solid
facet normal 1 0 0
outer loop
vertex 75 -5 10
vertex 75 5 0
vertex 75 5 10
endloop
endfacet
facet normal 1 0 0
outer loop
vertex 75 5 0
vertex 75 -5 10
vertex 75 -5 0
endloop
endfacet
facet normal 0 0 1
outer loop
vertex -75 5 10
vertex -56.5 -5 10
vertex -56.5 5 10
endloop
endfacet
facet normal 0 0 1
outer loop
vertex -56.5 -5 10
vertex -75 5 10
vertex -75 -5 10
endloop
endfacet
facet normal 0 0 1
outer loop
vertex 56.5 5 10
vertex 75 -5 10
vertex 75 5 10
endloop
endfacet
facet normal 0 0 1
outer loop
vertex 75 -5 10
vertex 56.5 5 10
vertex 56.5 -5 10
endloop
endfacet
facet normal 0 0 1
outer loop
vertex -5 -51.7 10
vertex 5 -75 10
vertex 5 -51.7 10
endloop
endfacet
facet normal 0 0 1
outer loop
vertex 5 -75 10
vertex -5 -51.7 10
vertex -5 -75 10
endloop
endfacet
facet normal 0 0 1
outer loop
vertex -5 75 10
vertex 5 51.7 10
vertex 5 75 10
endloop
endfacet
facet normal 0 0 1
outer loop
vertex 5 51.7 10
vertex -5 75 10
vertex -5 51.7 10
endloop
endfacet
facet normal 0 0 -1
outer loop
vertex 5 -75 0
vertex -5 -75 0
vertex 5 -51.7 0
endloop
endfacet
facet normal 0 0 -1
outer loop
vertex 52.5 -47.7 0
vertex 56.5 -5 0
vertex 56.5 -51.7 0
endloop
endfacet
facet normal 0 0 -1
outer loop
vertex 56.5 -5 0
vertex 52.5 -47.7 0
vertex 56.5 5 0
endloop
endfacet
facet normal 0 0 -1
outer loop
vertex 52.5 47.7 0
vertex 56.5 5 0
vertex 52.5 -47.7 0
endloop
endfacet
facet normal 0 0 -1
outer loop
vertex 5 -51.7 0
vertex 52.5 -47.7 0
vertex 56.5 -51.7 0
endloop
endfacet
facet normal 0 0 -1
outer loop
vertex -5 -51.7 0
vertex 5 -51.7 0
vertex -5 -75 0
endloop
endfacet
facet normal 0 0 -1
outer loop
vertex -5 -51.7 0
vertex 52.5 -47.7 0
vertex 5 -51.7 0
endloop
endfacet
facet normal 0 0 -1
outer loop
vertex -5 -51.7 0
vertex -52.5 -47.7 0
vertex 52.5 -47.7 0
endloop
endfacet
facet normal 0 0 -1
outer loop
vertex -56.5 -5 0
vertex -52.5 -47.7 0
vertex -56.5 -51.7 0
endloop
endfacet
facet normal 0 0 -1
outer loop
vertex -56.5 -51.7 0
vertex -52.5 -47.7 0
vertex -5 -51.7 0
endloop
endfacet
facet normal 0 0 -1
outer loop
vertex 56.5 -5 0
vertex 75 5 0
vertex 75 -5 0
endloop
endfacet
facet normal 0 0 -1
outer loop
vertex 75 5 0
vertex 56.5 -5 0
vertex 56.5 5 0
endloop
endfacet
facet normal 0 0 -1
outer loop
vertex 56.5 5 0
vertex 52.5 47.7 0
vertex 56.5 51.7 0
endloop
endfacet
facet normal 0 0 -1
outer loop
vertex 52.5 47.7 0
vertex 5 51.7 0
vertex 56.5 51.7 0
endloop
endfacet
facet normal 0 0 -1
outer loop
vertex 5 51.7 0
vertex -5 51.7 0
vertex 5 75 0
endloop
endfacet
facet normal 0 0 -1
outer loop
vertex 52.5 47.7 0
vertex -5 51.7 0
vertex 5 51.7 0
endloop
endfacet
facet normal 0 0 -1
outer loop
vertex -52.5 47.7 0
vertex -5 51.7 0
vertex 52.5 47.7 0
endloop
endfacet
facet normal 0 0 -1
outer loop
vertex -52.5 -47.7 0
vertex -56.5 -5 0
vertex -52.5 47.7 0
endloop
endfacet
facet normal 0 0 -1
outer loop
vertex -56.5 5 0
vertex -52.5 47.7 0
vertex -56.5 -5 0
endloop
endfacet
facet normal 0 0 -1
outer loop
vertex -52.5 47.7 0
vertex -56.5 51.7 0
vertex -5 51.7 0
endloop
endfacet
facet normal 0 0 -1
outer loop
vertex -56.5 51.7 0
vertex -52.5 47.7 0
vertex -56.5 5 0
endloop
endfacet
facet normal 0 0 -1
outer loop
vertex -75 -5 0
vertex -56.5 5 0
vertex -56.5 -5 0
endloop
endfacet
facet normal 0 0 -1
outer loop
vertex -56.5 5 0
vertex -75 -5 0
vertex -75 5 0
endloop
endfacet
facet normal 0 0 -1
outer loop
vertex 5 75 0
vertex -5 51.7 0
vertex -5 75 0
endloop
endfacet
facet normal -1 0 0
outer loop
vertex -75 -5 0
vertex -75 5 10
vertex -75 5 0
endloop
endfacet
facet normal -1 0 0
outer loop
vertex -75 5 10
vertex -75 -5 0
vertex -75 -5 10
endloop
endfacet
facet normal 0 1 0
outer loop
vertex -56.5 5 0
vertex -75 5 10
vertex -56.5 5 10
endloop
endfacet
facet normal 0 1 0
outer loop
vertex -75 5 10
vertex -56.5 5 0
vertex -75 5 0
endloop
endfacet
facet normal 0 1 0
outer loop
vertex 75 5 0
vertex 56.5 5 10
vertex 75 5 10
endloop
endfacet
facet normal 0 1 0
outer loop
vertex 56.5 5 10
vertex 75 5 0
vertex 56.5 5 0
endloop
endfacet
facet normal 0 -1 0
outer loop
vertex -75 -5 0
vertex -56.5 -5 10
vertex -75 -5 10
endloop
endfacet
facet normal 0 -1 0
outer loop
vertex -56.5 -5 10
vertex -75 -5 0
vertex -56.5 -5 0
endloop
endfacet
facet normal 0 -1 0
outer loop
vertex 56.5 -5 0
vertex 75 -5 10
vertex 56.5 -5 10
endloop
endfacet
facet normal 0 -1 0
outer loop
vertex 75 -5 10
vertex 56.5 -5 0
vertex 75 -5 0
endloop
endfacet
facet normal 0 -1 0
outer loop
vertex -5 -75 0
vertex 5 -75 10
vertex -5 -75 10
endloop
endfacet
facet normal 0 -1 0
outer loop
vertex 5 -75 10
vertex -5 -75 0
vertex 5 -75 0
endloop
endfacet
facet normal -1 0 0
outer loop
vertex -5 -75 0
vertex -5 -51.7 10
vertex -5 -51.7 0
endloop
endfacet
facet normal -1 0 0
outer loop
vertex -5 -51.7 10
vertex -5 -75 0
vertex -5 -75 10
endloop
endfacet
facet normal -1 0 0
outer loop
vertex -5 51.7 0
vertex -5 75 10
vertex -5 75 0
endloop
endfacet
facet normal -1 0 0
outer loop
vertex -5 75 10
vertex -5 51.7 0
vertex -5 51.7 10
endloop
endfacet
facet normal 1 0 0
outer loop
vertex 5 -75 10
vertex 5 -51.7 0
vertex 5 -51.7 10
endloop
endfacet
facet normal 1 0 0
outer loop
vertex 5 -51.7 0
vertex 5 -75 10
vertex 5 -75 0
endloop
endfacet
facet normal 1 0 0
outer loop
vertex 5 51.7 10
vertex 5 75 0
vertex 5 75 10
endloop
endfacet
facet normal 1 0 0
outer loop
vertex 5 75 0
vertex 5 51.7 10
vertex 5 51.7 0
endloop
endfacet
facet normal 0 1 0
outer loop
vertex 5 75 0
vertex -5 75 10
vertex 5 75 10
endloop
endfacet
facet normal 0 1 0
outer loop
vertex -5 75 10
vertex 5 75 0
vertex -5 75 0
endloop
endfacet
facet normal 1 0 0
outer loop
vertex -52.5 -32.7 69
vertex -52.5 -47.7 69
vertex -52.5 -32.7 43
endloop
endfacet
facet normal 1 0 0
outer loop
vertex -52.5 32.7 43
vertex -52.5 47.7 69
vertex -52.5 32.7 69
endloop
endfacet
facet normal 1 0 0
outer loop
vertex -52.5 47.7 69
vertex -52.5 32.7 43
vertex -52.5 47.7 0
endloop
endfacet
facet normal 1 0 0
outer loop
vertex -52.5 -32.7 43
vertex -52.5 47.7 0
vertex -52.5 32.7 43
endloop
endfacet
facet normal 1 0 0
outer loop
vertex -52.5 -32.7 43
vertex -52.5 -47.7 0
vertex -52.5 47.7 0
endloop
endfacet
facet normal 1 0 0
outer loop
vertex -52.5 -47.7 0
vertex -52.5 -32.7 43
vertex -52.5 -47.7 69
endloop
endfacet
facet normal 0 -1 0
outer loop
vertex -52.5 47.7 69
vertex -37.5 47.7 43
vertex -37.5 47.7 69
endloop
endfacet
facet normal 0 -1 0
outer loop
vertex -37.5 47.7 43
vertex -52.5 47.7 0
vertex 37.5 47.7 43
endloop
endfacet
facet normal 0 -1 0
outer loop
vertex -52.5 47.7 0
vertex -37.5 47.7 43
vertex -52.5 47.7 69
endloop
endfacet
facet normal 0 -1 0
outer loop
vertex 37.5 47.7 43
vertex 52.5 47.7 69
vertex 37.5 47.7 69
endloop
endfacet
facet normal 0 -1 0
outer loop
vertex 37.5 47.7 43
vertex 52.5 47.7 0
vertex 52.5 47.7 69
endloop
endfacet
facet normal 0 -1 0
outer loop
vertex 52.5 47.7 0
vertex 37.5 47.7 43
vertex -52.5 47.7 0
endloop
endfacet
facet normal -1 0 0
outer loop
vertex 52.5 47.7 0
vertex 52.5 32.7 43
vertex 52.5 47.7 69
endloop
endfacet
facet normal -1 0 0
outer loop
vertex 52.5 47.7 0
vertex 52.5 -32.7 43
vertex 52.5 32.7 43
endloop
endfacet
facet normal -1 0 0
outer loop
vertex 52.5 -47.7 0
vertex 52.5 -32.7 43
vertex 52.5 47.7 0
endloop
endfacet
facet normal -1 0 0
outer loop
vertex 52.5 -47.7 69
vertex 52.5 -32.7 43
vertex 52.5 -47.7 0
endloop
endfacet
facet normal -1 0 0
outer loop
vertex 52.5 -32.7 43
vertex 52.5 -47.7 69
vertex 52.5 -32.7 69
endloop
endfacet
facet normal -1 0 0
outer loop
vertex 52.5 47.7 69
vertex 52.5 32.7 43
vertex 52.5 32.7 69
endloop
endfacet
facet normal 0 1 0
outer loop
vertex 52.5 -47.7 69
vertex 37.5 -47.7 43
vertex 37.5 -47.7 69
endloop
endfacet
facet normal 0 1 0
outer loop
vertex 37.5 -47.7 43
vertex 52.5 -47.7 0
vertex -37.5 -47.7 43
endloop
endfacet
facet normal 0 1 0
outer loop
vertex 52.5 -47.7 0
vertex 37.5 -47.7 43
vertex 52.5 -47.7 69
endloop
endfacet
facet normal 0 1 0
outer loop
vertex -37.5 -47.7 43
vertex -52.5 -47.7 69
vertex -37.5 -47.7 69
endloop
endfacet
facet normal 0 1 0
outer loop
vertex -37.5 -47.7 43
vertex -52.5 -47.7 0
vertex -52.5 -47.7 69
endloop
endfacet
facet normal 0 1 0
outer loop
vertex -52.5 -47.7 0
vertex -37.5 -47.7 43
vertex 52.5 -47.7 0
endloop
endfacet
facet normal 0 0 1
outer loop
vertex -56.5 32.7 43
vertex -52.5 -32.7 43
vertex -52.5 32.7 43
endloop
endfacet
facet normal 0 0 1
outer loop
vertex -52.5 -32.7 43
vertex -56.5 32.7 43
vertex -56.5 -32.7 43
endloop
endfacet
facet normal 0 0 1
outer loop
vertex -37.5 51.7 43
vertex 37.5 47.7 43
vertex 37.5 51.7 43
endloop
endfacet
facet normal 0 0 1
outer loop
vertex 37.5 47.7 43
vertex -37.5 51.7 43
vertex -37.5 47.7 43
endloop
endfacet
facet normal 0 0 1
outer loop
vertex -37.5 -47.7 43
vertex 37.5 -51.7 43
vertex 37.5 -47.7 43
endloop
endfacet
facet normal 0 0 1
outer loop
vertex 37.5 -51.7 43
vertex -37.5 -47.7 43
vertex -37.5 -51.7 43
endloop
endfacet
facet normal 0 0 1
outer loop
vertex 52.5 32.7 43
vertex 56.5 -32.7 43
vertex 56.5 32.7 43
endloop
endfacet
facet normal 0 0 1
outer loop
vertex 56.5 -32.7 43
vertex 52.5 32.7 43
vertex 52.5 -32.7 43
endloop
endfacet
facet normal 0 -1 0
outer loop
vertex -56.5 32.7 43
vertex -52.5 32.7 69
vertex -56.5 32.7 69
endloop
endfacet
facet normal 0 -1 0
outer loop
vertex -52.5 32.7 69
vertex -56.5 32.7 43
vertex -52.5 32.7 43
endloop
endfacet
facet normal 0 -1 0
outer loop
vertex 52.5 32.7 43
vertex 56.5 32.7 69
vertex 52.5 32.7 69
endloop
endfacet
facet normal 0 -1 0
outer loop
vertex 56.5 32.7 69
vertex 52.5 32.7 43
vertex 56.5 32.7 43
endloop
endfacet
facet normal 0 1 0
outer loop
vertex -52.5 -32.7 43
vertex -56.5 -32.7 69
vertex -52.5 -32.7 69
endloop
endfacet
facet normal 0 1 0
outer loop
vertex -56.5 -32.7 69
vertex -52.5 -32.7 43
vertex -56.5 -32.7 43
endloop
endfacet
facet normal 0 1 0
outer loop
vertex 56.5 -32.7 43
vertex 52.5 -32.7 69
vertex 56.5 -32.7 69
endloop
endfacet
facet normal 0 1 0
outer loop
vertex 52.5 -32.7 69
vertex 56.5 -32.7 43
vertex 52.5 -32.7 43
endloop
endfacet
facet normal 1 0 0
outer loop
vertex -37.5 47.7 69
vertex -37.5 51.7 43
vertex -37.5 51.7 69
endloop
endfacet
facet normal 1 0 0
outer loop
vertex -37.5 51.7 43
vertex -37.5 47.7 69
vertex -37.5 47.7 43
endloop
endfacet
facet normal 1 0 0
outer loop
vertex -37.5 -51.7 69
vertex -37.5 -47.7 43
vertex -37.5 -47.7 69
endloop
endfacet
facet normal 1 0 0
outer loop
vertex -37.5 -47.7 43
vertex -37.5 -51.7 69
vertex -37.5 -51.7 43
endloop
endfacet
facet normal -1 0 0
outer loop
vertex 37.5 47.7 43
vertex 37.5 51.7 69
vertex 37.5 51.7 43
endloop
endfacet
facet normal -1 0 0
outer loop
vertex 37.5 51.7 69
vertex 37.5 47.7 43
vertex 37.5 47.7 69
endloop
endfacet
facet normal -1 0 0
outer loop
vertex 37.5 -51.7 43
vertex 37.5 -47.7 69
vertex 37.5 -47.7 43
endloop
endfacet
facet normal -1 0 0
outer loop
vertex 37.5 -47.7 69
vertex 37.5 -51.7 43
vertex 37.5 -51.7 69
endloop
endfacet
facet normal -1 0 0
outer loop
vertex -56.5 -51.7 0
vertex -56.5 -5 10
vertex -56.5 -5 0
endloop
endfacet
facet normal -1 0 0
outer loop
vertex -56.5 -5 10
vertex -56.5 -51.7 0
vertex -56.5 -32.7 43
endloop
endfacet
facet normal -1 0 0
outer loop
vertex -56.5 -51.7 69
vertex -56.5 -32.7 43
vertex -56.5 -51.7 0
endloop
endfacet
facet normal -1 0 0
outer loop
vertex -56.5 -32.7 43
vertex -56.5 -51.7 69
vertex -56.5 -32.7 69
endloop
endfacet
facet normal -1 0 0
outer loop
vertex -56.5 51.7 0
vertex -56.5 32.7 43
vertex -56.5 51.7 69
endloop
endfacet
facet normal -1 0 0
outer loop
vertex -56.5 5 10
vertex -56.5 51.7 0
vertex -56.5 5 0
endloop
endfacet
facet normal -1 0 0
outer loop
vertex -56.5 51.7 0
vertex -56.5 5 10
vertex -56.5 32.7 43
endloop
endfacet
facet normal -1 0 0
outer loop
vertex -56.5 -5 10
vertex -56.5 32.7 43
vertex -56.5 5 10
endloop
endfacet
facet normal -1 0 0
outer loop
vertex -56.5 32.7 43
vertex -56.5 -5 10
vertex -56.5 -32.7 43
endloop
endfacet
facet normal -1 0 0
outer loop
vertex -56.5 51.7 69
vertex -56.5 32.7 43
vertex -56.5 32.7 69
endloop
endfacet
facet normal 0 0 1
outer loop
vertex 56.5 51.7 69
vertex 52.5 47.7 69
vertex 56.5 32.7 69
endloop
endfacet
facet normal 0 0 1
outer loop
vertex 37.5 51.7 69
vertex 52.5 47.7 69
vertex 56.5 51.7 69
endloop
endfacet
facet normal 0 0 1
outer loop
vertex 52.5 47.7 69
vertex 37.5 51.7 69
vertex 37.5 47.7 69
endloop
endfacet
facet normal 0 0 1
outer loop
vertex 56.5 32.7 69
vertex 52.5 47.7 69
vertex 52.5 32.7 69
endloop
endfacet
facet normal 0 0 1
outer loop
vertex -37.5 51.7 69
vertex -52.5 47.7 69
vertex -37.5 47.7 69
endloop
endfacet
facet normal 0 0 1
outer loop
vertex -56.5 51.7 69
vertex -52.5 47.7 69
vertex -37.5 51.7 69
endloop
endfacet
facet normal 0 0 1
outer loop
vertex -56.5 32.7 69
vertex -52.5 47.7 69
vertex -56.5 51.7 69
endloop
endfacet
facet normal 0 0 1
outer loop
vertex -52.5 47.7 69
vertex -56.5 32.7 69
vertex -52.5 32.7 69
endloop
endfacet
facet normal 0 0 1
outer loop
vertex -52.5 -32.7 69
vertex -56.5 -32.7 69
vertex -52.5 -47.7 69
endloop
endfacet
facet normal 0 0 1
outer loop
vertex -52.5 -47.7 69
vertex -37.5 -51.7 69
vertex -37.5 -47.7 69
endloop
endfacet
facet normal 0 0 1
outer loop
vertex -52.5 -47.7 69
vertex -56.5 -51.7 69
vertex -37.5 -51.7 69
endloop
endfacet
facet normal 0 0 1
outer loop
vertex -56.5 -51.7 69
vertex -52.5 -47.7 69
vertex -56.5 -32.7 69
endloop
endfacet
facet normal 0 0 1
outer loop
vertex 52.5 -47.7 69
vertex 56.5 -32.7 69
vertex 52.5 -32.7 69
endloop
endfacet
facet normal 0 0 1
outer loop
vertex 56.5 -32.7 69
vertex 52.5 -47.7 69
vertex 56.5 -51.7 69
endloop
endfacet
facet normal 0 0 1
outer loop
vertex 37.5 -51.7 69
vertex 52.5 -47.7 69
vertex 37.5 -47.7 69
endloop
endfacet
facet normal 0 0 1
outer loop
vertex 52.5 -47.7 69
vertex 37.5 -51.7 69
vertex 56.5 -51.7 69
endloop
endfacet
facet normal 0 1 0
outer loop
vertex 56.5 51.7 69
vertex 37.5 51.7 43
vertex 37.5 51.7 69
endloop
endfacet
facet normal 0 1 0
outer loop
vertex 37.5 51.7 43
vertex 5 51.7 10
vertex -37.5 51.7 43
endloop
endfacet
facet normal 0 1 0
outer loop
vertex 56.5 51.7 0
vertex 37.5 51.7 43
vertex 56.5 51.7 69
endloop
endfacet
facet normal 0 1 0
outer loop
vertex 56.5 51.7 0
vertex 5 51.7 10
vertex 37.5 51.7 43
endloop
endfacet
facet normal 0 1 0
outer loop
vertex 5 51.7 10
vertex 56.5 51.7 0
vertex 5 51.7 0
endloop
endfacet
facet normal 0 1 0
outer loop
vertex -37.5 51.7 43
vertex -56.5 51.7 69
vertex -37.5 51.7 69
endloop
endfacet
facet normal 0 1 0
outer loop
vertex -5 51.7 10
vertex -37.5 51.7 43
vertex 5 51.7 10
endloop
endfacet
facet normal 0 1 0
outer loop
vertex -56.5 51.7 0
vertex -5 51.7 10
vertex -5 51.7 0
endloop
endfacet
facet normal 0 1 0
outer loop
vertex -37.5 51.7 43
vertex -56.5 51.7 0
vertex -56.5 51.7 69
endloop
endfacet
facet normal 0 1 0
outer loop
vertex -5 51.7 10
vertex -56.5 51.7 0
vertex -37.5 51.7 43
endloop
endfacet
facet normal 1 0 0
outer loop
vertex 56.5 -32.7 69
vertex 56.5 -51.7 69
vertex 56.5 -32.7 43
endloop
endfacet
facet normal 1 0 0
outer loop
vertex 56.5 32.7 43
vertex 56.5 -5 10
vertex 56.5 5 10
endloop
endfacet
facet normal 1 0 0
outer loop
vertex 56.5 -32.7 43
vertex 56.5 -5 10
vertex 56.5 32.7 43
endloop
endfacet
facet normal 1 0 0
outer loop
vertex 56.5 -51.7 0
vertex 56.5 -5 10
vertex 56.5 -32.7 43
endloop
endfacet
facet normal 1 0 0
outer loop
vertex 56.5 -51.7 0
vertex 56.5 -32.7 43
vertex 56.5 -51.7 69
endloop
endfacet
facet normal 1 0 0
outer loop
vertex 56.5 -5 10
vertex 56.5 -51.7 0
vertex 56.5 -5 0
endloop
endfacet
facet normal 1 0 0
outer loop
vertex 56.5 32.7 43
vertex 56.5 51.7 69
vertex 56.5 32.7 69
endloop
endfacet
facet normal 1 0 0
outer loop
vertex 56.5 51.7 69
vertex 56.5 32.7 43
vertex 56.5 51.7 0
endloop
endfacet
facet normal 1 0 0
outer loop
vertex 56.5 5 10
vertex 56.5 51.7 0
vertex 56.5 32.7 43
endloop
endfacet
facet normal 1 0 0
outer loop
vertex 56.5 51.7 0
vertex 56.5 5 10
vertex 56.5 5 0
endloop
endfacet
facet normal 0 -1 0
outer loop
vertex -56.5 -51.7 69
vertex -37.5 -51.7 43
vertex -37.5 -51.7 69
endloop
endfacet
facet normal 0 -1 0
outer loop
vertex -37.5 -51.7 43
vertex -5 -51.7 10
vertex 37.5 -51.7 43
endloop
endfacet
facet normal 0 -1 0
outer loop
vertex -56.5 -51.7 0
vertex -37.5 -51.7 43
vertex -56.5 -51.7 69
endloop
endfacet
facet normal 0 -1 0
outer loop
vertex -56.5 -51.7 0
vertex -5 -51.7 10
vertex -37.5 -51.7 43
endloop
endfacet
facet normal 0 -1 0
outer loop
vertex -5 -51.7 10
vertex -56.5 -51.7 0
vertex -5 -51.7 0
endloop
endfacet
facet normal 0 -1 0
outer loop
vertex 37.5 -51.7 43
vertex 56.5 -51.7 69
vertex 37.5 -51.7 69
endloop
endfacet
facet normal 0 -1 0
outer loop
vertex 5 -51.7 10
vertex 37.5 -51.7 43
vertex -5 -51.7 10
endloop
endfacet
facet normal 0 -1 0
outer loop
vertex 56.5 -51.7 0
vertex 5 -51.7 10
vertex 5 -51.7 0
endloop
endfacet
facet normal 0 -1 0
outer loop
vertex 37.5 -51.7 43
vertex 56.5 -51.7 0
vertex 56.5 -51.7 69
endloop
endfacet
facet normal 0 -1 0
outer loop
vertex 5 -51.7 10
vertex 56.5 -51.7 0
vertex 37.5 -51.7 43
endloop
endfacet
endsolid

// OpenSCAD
// box constants
BOX_SQUARE = 150;

// card holder dimensions.
CARD_WIDTH = 105;
CARD_HEIGHT = 95.40;
CARD_DEPTH_LOW = 43;
CARD_DEPTH_HIGH= 69;
CARD_LID_WIDTH = 15;
CARD_LID_THICKNESS = 5;

// incubus holder dimensions.
INCUBUS_WIDTH = 30.35;
INCUBUS_HEIGHT = 18;

module box_bar() {
    box_bar_size = 10;
    cube([BOX_SQUARE, box_bar_size, box_bar_size], true);
} 

module cross() {
    translate([0,0,5]) union() {
        box_bar();
        rotate([0,0,90]) box_bar();
    }
}

module holy_cross() {
    difference() {
        cross();
        linear_extrude(height=CARD_DEPTH_HIGH, center=false) square([CARD_WIDTH, CARD_HEIGHT], true);
    }
}

//cross();

module card_cube(x=CARD_WIDTH, y=CARD_HEIGHT, z=CARD_DEPTH_HIGH, padding=8) {
    linear_extrude(height=z, center=false) difference() {
        square([x+padding, y+padding], true);
    }
}

module card_walls() {
    // lay out the cutouts
    difference() {
        card_cube();
        union() {
            translate([0,0,CARD_DEPTH_LOW]) card_cube(x=CARD_WIDTH+10, y=CARD_HEIGHT-(2*CARD_LID_WIDTH), z=100, padding=0);
        translate([0,0,CARD_DEPTH_LOW]) card_cube(x=CARD_WIDTH-(2*CARD_LID_WIDTH), y=CARD_HEIGHT+10, z=100, padding=0);
        }
    }
    
}
module card_holder() {
    
    difference() {
        card_walls();
        linear_extrude(height=CARD_DEPTH_HIGH, center=false) square([CARD_WIDTH, CARD_HEIGHT], true);
    }
}

module onirim_case() {
    union() {
        holy_cross();
        card_holder();
    }
}
//cross();
//holy_cross();
//card_holder();

onirim_case();
